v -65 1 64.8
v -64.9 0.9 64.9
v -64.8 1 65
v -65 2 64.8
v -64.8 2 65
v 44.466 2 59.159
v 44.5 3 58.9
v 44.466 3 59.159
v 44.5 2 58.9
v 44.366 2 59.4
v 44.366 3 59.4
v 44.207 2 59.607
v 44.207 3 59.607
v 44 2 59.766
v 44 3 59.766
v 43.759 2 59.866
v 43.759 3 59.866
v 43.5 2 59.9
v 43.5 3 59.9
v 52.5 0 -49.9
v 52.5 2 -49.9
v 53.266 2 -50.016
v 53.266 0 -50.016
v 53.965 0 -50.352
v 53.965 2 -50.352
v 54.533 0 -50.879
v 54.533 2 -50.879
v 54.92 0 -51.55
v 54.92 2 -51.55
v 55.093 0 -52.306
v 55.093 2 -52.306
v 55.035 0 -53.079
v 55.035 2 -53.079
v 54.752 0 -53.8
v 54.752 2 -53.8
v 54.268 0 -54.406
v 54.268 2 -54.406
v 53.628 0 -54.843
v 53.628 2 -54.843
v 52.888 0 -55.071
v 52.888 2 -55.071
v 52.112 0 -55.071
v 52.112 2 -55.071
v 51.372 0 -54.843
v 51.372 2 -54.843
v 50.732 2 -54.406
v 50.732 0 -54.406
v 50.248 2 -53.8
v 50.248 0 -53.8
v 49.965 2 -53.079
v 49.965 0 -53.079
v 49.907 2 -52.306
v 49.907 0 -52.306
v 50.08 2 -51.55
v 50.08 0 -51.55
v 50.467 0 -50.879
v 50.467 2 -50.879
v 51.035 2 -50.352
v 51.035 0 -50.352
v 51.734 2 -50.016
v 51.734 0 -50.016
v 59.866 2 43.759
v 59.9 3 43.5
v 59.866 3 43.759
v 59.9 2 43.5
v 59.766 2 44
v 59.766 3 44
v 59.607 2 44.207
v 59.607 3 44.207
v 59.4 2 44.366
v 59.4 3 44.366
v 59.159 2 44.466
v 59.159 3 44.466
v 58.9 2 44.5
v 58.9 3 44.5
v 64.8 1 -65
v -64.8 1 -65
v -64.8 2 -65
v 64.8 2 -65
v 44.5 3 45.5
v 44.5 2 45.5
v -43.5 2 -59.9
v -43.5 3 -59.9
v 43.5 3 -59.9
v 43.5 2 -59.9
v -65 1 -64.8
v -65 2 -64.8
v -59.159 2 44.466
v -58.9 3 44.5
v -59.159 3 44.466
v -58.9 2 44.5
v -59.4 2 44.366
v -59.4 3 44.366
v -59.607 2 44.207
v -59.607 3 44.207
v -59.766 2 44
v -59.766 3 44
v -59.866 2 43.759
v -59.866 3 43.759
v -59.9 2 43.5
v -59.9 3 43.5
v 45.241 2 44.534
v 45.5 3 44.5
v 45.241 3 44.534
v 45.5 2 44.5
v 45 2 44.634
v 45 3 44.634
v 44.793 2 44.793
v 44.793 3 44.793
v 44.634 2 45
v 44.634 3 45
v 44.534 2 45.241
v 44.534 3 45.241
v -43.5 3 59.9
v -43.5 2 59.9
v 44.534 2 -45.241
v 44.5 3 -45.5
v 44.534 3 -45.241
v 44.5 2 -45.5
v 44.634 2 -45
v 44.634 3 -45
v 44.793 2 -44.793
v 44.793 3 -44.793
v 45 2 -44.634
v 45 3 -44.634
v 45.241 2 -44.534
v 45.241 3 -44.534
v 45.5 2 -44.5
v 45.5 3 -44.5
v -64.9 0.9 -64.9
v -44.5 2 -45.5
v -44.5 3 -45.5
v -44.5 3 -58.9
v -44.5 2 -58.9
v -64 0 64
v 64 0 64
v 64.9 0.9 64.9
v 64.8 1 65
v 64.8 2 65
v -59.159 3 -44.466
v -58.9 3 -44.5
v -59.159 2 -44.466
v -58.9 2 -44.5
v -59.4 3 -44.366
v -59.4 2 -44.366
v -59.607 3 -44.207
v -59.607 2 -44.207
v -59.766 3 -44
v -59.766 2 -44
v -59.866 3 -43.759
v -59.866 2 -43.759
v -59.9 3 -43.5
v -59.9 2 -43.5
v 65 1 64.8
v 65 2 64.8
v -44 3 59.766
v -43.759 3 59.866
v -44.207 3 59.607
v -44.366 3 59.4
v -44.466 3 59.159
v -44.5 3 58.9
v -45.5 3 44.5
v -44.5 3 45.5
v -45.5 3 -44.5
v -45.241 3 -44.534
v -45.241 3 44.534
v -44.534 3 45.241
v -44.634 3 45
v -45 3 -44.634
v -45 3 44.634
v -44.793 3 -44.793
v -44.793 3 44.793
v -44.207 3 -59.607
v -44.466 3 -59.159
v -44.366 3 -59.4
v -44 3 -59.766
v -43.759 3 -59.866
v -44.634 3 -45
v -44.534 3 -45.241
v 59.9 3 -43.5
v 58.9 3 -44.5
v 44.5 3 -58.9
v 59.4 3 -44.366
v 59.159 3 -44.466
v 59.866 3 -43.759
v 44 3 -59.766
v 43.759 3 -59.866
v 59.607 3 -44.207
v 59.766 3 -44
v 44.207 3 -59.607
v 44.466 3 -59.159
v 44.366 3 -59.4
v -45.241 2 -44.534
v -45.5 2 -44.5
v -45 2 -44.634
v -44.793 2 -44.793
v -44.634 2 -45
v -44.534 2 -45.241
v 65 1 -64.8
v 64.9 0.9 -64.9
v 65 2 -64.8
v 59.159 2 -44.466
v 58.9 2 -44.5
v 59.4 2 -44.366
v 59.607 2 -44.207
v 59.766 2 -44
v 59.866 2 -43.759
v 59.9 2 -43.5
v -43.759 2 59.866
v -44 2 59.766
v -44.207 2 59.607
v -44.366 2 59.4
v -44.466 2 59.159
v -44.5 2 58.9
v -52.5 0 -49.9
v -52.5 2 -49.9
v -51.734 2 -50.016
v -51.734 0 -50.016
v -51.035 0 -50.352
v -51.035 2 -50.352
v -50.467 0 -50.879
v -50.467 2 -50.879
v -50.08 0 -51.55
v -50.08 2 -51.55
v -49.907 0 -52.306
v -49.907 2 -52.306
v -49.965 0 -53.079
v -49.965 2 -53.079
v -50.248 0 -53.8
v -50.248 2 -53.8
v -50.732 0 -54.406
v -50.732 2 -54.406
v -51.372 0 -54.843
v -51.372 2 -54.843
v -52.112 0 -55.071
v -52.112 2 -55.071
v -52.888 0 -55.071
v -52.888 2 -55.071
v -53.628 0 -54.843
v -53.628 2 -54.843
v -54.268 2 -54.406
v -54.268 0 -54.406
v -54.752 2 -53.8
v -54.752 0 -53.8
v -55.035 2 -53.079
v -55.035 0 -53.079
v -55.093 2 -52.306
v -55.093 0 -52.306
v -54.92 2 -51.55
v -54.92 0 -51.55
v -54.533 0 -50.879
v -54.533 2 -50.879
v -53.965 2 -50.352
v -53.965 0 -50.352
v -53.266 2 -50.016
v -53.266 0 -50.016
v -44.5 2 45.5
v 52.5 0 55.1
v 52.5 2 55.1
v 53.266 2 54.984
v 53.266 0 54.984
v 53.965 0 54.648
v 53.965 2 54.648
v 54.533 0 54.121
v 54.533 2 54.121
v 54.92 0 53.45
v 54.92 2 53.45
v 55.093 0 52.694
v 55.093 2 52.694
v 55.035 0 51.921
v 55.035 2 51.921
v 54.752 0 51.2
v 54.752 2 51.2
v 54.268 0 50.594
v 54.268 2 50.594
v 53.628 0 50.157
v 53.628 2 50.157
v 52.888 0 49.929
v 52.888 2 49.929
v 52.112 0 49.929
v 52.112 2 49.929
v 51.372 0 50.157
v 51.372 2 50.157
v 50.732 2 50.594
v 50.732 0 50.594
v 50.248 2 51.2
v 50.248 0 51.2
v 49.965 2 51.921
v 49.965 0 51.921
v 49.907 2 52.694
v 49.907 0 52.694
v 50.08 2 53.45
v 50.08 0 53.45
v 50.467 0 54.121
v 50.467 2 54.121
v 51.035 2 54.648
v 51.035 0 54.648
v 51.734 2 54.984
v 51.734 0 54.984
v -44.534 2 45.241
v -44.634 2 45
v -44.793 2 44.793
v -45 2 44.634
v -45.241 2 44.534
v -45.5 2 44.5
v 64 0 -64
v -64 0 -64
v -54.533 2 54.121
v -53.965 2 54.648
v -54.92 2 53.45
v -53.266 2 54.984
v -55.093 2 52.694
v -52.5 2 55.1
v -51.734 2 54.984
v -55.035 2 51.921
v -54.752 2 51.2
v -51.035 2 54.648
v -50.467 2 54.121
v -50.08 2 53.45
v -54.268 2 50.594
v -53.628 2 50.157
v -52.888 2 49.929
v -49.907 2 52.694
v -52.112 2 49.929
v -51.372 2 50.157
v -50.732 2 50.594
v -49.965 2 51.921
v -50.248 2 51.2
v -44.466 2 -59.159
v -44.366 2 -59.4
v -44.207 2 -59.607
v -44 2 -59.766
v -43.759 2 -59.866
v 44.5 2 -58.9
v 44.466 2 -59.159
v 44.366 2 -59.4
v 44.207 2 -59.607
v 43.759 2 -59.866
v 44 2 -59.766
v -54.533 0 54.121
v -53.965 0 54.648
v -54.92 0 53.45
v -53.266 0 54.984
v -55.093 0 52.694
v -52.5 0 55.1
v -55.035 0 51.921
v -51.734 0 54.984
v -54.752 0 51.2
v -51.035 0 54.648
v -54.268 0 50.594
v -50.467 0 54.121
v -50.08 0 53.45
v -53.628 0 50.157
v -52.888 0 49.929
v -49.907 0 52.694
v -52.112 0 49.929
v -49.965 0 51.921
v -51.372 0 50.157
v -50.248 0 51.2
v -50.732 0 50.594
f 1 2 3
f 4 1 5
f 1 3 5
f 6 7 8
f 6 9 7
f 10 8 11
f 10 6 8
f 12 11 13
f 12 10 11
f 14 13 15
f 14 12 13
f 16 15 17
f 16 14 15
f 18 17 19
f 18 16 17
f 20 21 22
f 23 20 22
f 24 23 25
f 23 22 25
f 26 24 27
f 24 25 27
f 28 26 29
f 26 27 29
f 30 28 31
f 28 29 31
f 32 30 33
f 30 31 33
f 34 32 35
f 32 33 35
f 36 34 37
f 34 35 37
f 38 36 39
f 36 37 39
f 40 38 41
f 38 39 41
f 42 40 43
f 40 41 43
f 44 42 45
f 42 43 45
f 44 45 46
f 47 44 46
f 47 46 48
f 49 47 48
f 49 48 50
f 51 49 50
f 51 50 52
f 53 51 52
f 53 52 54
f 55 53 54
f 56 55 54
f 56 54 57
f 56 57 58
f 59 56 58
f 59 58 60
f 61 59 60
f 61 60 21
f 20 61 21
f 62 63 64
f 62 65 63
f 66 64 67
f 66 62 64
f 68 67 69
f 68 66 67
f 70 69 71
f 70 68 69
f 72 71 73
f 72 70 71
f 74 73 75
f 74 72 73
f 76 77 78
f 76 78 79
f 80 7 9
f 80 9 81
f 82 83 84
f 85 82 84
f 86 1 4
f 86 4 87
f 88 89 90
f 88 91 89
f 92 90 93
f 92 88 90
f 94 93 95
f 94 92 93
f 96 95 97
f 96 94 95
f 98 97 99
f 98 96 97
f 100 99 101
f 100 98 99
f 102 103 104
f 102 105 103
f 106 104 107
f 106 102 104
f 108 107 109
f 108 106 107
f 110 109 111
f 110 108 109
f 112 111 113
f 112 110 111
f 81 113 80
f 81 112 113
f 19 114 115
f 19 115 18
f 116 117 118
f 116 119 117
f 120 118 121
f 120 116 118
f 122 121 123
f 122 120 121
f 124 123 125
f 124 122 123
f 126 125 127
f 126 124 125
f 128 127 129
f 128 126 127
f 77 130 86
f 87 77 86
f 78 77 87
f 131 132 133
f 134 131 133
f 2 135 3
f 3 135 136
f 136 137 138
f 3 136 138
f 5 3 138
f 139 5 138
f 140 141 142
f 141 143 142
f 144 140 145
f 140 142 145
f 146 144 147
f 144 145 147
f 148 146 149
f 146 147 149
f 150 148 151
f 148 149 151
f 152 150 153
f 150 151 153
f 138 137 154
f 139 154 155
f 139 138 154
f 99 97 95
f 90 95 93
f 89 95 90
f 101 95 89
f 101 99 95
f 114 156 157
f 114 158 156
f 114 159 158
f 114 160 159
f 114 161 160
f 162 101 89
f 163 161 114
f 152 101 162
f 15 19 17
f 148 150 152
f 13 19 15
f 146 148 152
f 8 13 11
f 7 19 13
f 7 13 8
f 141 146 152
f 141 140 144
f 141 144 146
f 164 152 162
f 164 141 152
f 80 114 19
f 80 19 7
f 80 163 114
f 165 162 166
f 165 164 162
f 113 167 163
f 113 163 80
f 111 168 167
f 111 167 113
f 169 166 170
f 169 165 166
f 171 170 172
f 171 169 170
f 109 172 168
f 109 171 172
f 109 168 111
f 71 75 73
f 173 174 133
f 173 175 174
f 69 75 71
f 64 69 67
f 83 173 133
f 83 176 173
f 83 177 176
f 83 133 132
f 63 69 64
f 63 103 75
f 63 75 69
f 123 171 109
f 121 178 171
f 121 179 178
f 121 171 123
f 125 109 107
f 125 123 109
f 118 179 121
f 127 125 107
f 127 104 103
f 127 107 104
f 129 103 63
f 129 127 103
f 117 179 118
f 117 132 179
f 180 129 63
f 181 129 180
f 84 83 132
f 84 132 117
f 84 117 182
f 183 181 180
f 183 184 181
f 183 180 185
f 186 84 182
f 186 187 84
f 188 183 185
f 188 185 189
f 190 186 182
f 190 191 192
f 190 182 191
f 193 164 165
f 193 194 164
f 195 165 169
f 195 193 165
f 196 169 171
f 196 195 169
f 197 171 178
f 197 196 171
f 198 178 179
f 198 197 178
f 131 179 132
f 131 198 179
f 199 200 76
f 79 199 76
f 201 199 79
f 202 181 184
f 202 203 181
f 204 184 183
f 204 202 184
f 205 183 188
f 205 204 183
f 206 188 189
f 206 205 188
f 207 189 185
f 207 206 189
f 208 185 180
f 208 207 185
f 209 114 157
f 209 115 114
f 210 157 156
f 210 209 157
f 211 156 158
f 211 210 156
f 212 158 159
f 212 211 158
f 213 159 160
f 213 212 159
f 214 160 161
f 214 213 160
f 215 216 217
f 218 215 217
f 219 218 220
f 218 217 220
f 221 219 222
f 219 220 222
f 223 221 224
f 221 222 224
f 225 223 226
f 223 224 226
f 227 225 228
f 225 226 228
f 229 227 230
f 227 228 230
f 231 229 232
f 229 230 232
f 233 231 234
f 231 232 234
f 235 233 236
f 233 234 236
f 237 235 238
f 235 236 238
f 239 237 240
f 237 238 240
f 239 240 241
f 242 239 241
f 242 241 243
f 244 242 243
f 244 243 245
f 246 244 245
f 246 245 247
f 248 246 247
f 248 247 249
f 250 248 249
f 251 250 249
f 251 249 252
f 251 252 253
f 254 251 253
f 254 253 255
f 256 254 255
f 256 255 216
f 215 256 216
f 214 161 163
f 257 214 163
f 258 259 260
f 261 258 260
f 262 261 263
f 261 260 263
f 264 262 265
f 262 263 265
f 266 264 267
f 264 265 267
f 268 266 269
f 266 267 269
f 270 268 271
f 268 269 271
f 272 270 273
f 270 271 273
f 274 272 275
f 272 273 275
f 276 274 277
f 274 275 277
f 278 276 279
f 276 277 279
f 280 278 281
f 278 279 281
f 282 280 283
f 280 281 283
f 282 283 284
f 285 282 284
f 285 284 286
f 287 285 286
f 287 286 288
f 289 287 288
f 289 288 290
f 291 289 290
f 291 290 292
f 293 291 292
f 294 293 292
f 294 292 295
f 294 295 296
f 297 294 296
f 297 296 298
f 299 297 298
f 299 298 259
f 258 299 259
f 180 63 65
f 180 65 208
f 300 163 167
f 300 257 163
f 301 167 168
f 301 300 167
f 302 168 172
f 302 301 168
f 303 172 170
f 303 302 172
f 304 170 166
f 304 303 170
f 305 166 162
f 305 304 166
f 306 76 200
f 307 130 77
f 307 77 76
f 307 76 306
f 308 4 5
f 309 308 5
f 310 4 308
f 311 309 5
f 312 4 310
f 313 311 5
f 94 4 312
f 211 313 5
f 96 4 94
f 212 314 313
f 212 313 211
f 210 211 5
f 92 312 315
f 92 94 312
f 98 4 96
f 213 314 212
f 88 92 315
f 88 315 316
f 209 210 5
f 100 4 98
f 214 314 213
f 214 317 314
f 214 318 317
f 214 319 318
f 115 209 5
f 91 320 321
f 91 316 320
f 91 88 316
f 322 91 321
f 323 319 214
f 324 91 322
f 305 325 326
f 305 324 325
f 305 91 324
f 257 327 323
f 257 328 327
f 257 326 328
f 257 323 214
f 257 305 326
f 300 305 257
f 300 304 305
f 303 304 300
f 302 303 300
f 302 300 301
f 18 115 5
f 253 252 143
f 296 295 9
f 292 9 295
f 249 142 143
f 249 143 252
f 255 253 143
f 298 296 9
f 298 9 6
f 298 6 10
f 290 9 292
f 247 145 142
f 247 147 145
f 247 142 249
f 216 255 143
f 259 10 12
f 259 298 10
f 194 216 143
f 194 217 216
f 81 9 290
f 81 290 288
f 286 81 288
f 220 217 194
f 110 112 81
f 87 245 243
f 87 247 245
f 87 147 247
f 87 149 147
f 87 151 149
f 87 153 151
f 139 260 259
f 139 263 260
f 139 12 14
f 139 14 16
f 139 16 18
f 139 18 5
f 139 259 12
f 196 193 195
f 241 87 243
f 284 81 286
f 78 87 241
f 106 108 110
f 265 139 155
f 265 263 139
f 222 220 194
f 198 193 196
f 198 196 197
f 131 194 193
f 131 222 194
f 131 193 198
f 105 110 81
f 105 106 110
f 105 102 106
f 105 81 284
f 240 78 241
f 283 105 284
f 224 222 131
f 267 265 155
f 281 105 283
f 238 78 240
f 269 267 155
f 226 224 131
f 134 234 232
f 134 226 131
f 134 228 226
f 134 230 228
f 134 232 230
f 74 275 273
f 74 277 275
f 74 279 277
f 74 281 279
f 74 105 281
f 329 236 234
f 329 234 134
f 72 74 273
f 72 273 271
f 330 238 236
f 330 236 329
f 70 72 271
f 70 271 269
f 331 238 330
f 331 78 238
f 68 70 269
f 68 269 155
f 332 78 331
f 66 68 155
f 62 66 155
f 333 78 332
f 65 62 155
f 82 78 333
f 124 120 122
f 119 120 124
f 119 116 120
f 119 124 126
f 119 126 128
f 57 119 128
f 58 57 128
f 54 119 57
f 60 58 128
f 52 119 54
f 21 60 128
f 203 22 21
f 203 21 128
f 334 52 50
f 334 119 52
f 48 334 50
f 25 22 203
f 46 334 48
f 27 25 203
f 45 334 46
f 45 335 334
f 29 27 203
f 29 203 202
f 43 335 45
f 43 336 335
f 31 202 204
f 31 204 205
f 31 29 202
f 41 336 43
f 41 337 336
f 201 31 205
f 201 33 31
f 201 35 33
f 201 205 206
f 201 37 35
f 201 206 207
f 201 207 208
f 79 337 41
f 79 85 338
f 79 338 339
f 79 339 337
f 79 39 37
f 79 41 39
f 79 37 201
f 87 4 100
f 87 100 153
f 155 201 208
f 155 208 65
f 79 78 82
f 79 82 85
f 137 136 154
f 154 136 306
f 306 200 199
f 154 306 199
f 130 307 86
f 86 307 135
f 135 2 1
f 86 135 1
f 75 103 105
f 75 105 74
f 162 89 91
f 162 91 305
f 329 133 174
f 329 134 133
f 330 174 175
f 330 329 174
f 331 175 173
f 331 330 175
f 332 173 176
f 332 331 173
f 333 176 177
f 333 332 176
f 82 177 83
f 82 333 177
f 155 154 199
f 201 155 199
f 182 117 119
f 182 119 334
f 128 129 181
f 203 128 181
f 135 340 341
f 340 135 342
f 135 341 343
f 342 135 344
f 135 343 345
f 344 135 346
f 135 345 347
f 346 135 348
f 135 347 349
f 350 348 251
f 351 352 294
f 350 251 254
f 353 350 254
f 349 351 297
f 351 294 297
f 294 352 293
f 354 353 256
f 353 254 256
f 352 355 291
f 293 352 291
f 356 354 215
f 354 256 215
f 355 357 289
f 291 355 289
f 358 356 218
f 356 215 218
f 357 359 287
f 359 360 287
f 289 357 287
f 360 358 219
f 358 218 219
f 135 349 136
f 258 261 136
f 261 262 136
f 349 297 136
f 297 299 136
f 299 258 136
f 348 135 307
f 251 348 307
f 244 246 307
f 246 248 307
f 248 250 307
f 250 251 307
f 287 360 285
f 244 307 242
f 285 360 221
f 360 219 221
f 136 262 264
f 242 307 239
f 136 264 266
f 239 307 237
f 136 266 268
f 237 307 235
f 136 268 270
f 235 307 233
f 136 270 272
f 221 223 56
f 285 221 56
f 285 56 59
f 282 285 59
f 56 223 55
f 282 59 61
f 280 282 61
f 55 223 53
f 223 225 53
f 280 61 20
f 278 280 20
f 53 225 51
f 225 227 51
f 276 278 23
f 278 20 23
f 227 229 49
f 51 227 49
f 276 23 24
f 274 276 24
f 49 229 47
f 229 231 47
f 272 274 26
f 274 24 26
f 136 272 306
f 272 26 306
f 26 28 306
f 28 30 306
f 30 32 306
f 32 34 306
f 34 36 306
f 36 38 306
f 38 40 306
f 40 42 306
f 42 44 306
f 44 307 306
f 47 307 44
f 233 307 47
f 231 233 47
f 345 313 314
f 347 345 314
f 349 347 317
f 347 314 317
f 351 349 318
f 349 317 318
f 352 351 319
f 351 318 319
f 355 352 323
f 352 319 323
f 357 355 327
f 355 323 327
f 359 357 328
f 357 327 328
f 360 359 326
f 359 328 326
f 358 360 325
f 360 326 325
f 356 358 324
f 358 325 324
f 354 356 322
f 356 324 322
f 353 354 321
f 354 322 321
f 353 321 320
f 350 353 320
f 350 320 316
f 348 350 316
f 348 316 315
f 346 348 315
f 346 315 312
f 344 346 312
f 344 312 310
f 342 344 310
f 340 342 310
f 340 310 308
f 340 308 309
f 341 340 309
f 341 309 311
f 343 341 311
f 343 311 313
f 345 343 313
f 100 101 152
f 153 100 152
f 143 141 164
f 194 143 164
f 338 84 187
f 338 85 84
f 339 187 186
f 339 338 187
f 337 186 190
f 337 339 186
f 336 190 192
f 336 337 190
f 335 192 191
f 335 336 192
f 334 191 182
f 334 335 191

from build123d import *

# Parameters (mm, degrees)
SKETCH_1_W          = 130
SKETCH_1_H          = 130
EXTRUDE_1_DEPTH     = 3
SKETCH_2_R          = 2.6
CUT_EXTRUDE_1_DEPTH = 92.972822073
SKETCH_4_W          = 20.5
SKETCH_4_H          = 20.5
CUT_EXTRUDE_2_DEPTH = 1
SKETCH_5_W          = 89
SKETCH_5_H          = 5.1
SKETCH_5_W_2        = 5.1
SKETCH_5_H_2        = 89
CUT_EXTRUDE_3_DEPTH = 1
CHAMFER_1_SIZE      = 0.2
CHAMFER_2_SIZE      = 1
FILLET_2_R          = 1


with BuildPart() as part:
    # 草图1 → 凸台-拉伸1 (new body)
    with BuildSketch(Plane(origin=(0, 0, 0), x_dir=(1, 0, 0), z_dir=(0, 1, 0))):
        Rectangle(SKETCH_1_W, SKETCH_1_H)
    extrude(amount=EXTRUDE_1_DEPTH)

    # 草图2 → 切除-拉伸1 (cut, through all)
    with BuildSketch(Plane(origin=(0, 3, 0), x_dir=(1, 0, 0), z_dir=(0, 1, 0))):
        with Locations(Location((52.5, 52.5, 0), (0, 0, 270))):
            Circle(SKETCH_2_R)
        with Locations(Location((52.5, -52.5, 0), (0, 0, 270))):
            Circle(SKETCH_2_R)
        with Locations(Location((-52.5, -52.5, 0), (0, 0, 270))):
            Circle(SKETCH_2_R)
        with Locations(Location((-52.5, 52.5, 0), (0, 0, 270))):
            Circle(SKETCH_2_R)
    extrude(amount=-CUT_EXTRUDE_1_DEPTH, mode=Mode.SUBTRACT)

    # 草图4 → 切除-拉伸2 (cut)
    with BuildSketch(Plane(origin=(0, 3, 0), x_dir=(1, 0, 0), z_dir=(0, 1, 0))):
        with Locations((54.75, 54.75)):
            Rectangle(SKETCH_4_W, SKETCH_4_H)
        with Locations((54.75, -54.75)):
            Rectangle(SKETCH_4_W, SKETCH_4_H)
        with Locations((-54.75, -54.75)):
            Rectangle(SKETCH_4_W, SKETCH_4_H)
        with Locations((-54.75, 54.75)):
            Rectangle(SKETCH_4_W, SKETCH_4_H)
    extrude(amount=-CUT_EXTRUDE_2_DEPTH, mode=Mode.SUBTRACT)

    # 草图5 → 切除-拉伸3 (cut)
    with BuildSketch(Plane(origin=(0, 3, 0), x_dir=(1, 0, 0), z_dir=(0, 1, 0))):
        with Locations((0, 62.45)):
            Rectangle(SKETCH_5_W, SKETCH_5_H)
        with Locations((62.45, 0)):
            Rectangle(SKETCH_5_W_2, SKETCH_5_H_2)
        with Locations((0, -62.45)):
            Rectangle(SKETCH_5_W, SKETCH_5_H)
        with Locations((-62.45, 0)):
            Rectangle(SKETCH_5_W_2, SKETCH_5_H_2)
    extrude(amount=-CUT_EXTRUDE_3_DEPTH, mode=Mode.SUBTRACT)

    # 倒角1
    chamfer_1_edges = [part.edges().sort_by_distance(p)[0] for p in [
        (65, 1, 65),
        (-65, 1, 65),
        (-65, 1, -65),
        (65, 1, -65),
    ]]
    chamfer(chamfer_1_edges, length=CHAMFER_1_SIZE)

    # 倒角2
    # the kernel refuses this chamfer: 1 mm, written as the material it takes off along each edge
    with BuildSketch(Plane(origin=(67.371682988, 0, 65), x_dir=(0, -0.027495876610586292, -0.9996219169112968), z_dir=(-1, 0, 0)), Plane(origin=(65, 0, -67.371682988), x_dir=(-0.9996219169112968, -0.027495876610586292, 0), z_dir=(0, 0, 1)), Plane(origin=(-65, 0, 67.371682988), x_dir=(0.9996219169112968, -0.027495876610586292, 0), z_dir=(0, 0, -1))) as chamfer_2_piece_1:
        Polygon((CHAMFER_2_SIZE * 0.999621916911, -CHAMFER_2_SIZE * 0.0274958766106), (-CHAMFER_2_SIZE * 0.0274958766106, -CHAMFER_2_SIZE * 0.999621916911), (0, 0), align=None)
    extrude(amount=134.743365976, mode=Mode.SUBTRACT)
    with BuildSketch(Plane(origin=(-67.371682988, 0, -65), x_dir=(0, 0.999621916911297, -0.02749587661058218), z_dir=(1, 0, 0))) as chamfer_2_piece_2:
        Polygon((CHAMFER_2_SIZE * 0.999621916911, CHAMFER_2_SIZE * 0.0274958766106), (-CHAMFER_2_SIZE * 0.0274958766106, CHAMFER_2_SIZE * 0.999621916911), (0, 0), align=None)
    extrude(amount=134.743365976, mode=Mode.SUBTRACT)

    # 圆角2
    fillet_2_edges = [part.edges().sort_by_distance(p)[0] for p in [
        (-44.5, 2.5, -59.9),
        (44.5, 2.5, -59.9),
        (59.9, 2.5, -44.5),
        (59.9, 2.5, 44.5),
        (44.5, 2.5, 59.9),
        (-44.5, 2.5, 59.9),
        (-59.9, 2.5, 44.5),
        (-59.9, 2.5, -44.5),
        (-44.5, 2.5, -44.5),
        (-44.5, 2.5, 44.5),
        (44.5, 2.5, 44.5),
        (44.5, 2.5, -44.5),
    ]]
    fillet(fillet_2_edges, radius=FILLET_2_R)


solid = part.part
